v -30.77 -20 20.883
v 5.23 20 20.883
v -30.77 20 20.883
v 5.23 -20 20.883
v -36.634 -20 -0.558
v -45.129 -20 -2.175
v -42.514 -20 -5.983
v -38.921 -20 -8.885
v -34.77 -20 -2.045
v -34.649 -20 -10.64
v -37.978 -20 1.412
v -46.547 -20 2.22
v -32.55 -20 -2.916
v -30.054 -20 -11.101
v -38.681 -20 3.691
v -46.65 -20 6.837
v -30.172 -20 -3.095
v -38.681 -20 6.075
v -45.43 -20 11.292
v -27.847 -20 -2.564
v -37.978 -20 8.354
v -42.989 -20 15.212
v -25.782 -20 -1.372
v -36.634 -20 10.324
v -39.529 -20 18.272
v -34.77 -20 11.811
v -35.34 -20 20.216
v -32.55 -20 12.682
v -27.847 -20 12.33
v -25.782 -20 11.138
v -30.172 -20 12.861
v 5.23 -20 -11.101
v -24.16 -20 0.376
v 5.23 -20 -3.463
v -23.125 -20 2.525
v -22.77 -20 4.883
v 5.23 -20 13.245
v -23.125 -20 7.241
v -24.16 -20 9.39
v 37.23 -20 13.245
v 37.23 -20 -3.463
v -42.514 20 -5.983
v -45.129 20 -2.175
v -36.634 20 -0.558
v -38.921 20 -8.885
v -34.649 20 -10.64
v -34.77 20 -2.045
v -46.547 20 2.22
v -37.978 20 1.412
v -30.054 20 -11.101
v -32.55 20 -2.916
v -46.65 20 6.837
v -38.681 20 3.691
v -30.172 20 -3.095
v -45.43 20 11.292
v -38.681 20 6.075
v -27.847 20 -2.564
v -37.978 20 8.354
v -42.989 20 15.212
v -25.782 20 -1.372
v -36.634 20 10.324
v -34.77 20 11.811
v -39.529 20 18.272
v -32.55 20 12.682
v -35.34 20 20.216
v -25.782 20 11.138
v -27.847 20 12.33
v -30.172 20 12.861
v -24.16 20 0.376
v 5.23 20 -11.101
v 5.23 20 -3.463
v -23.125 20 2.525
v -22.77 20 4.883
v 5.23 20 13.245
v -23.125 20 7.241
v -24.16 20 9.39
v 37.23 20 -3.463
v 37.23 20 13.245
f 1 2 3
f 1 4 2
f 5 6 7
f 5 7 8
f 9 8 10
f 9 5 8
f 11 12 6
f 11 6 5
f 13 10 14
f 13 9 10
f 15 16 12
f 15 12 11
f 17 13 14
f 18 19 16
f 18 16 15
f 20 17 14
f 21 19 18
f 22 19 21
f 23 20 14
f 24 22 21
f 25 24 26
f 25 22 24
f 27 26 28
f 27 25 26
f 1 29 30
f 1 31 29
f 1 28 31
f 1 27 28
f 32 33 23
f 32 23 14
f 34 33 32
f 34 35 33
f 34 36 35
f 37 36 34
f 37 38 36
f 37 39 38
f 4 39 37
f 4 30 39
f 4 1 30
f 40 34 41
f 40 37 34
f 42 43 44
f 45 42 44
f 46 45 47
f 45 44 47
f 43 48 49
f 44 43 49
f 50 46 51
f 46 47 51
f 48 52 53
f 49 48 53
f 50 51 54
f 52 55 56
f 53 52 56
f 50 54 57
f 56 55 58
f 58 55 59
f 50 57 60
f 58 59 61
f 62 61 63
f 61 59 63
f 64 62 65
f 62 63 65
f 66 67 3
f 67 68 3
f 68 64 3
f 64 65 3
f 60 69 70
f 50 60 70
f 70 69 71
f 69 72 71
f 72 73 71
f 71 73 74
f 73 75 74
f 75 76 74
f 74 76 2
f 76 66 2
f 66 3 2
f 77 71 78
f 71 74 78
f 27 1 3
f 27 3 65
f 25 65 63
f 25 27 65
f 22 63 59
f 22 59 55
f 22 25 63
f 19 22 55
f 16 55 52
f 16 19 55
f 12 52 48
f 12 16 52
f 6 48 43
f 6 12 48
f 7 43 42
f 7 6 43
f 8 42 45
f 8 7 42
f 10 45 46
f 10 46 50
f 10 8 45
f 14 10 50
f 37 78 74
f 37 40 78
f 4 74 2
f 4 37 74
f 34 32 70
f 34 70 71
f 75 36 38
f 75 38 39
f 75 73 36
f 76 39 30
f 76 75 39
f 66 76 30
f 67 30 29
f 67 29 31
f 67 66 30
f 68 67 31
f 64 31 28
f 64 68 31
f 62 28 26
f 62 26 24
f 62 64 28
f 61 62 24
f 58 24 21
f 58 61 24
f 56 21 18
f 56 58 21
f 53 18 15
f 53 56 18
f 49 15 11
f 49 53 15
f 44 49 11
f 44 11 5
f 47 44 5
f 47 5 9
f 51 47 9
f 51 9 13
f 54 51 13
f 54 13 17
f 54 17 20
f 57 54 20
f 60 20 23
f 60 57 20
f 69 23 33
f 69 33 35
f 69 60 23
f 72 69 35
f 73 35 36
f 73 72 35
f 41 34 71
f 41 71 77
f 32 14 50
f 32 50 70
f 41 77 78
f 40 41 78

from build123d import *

# Parameters (mm, degrees)
F0_R     = 8
F1_DEPTH = 20


with BuildPart() as f1:
    # F0 (on Front) → F1 (new body, symmetric)
    with BuildSketch(Plane.XZ):
        with BuildLine():
            Line((5.230114, 20.883032), (-30.769886, 20.883032))
            ThreePointArc((-30.769886, 20.883032), (-46.765878, 4.524912), (-30.053827, -11.100937))
            Line((-30.053827, -11.100937), (5.230114, -11.100937))
            Line((5.230114, -11.100937), (5.230114, -3.462973))
            Line((5.230114, -3.462973), (37.230114, -3.462973))
            Line((37.230114, -3.462973), (37.230114, 13.24507))
            Line((37.230114, 13.24507), (5.230114, 13.24507))
            Line((5.230114, 13.24507), (5.230114, 20.883032))
        make_face()
        with Locations((-30.769886, 4.883032)):
            Circle(F0_R, mode=Mode.SUBTRACT)
    extrude(amount=F1_DEPTH, both=True)


solid = f1.part
